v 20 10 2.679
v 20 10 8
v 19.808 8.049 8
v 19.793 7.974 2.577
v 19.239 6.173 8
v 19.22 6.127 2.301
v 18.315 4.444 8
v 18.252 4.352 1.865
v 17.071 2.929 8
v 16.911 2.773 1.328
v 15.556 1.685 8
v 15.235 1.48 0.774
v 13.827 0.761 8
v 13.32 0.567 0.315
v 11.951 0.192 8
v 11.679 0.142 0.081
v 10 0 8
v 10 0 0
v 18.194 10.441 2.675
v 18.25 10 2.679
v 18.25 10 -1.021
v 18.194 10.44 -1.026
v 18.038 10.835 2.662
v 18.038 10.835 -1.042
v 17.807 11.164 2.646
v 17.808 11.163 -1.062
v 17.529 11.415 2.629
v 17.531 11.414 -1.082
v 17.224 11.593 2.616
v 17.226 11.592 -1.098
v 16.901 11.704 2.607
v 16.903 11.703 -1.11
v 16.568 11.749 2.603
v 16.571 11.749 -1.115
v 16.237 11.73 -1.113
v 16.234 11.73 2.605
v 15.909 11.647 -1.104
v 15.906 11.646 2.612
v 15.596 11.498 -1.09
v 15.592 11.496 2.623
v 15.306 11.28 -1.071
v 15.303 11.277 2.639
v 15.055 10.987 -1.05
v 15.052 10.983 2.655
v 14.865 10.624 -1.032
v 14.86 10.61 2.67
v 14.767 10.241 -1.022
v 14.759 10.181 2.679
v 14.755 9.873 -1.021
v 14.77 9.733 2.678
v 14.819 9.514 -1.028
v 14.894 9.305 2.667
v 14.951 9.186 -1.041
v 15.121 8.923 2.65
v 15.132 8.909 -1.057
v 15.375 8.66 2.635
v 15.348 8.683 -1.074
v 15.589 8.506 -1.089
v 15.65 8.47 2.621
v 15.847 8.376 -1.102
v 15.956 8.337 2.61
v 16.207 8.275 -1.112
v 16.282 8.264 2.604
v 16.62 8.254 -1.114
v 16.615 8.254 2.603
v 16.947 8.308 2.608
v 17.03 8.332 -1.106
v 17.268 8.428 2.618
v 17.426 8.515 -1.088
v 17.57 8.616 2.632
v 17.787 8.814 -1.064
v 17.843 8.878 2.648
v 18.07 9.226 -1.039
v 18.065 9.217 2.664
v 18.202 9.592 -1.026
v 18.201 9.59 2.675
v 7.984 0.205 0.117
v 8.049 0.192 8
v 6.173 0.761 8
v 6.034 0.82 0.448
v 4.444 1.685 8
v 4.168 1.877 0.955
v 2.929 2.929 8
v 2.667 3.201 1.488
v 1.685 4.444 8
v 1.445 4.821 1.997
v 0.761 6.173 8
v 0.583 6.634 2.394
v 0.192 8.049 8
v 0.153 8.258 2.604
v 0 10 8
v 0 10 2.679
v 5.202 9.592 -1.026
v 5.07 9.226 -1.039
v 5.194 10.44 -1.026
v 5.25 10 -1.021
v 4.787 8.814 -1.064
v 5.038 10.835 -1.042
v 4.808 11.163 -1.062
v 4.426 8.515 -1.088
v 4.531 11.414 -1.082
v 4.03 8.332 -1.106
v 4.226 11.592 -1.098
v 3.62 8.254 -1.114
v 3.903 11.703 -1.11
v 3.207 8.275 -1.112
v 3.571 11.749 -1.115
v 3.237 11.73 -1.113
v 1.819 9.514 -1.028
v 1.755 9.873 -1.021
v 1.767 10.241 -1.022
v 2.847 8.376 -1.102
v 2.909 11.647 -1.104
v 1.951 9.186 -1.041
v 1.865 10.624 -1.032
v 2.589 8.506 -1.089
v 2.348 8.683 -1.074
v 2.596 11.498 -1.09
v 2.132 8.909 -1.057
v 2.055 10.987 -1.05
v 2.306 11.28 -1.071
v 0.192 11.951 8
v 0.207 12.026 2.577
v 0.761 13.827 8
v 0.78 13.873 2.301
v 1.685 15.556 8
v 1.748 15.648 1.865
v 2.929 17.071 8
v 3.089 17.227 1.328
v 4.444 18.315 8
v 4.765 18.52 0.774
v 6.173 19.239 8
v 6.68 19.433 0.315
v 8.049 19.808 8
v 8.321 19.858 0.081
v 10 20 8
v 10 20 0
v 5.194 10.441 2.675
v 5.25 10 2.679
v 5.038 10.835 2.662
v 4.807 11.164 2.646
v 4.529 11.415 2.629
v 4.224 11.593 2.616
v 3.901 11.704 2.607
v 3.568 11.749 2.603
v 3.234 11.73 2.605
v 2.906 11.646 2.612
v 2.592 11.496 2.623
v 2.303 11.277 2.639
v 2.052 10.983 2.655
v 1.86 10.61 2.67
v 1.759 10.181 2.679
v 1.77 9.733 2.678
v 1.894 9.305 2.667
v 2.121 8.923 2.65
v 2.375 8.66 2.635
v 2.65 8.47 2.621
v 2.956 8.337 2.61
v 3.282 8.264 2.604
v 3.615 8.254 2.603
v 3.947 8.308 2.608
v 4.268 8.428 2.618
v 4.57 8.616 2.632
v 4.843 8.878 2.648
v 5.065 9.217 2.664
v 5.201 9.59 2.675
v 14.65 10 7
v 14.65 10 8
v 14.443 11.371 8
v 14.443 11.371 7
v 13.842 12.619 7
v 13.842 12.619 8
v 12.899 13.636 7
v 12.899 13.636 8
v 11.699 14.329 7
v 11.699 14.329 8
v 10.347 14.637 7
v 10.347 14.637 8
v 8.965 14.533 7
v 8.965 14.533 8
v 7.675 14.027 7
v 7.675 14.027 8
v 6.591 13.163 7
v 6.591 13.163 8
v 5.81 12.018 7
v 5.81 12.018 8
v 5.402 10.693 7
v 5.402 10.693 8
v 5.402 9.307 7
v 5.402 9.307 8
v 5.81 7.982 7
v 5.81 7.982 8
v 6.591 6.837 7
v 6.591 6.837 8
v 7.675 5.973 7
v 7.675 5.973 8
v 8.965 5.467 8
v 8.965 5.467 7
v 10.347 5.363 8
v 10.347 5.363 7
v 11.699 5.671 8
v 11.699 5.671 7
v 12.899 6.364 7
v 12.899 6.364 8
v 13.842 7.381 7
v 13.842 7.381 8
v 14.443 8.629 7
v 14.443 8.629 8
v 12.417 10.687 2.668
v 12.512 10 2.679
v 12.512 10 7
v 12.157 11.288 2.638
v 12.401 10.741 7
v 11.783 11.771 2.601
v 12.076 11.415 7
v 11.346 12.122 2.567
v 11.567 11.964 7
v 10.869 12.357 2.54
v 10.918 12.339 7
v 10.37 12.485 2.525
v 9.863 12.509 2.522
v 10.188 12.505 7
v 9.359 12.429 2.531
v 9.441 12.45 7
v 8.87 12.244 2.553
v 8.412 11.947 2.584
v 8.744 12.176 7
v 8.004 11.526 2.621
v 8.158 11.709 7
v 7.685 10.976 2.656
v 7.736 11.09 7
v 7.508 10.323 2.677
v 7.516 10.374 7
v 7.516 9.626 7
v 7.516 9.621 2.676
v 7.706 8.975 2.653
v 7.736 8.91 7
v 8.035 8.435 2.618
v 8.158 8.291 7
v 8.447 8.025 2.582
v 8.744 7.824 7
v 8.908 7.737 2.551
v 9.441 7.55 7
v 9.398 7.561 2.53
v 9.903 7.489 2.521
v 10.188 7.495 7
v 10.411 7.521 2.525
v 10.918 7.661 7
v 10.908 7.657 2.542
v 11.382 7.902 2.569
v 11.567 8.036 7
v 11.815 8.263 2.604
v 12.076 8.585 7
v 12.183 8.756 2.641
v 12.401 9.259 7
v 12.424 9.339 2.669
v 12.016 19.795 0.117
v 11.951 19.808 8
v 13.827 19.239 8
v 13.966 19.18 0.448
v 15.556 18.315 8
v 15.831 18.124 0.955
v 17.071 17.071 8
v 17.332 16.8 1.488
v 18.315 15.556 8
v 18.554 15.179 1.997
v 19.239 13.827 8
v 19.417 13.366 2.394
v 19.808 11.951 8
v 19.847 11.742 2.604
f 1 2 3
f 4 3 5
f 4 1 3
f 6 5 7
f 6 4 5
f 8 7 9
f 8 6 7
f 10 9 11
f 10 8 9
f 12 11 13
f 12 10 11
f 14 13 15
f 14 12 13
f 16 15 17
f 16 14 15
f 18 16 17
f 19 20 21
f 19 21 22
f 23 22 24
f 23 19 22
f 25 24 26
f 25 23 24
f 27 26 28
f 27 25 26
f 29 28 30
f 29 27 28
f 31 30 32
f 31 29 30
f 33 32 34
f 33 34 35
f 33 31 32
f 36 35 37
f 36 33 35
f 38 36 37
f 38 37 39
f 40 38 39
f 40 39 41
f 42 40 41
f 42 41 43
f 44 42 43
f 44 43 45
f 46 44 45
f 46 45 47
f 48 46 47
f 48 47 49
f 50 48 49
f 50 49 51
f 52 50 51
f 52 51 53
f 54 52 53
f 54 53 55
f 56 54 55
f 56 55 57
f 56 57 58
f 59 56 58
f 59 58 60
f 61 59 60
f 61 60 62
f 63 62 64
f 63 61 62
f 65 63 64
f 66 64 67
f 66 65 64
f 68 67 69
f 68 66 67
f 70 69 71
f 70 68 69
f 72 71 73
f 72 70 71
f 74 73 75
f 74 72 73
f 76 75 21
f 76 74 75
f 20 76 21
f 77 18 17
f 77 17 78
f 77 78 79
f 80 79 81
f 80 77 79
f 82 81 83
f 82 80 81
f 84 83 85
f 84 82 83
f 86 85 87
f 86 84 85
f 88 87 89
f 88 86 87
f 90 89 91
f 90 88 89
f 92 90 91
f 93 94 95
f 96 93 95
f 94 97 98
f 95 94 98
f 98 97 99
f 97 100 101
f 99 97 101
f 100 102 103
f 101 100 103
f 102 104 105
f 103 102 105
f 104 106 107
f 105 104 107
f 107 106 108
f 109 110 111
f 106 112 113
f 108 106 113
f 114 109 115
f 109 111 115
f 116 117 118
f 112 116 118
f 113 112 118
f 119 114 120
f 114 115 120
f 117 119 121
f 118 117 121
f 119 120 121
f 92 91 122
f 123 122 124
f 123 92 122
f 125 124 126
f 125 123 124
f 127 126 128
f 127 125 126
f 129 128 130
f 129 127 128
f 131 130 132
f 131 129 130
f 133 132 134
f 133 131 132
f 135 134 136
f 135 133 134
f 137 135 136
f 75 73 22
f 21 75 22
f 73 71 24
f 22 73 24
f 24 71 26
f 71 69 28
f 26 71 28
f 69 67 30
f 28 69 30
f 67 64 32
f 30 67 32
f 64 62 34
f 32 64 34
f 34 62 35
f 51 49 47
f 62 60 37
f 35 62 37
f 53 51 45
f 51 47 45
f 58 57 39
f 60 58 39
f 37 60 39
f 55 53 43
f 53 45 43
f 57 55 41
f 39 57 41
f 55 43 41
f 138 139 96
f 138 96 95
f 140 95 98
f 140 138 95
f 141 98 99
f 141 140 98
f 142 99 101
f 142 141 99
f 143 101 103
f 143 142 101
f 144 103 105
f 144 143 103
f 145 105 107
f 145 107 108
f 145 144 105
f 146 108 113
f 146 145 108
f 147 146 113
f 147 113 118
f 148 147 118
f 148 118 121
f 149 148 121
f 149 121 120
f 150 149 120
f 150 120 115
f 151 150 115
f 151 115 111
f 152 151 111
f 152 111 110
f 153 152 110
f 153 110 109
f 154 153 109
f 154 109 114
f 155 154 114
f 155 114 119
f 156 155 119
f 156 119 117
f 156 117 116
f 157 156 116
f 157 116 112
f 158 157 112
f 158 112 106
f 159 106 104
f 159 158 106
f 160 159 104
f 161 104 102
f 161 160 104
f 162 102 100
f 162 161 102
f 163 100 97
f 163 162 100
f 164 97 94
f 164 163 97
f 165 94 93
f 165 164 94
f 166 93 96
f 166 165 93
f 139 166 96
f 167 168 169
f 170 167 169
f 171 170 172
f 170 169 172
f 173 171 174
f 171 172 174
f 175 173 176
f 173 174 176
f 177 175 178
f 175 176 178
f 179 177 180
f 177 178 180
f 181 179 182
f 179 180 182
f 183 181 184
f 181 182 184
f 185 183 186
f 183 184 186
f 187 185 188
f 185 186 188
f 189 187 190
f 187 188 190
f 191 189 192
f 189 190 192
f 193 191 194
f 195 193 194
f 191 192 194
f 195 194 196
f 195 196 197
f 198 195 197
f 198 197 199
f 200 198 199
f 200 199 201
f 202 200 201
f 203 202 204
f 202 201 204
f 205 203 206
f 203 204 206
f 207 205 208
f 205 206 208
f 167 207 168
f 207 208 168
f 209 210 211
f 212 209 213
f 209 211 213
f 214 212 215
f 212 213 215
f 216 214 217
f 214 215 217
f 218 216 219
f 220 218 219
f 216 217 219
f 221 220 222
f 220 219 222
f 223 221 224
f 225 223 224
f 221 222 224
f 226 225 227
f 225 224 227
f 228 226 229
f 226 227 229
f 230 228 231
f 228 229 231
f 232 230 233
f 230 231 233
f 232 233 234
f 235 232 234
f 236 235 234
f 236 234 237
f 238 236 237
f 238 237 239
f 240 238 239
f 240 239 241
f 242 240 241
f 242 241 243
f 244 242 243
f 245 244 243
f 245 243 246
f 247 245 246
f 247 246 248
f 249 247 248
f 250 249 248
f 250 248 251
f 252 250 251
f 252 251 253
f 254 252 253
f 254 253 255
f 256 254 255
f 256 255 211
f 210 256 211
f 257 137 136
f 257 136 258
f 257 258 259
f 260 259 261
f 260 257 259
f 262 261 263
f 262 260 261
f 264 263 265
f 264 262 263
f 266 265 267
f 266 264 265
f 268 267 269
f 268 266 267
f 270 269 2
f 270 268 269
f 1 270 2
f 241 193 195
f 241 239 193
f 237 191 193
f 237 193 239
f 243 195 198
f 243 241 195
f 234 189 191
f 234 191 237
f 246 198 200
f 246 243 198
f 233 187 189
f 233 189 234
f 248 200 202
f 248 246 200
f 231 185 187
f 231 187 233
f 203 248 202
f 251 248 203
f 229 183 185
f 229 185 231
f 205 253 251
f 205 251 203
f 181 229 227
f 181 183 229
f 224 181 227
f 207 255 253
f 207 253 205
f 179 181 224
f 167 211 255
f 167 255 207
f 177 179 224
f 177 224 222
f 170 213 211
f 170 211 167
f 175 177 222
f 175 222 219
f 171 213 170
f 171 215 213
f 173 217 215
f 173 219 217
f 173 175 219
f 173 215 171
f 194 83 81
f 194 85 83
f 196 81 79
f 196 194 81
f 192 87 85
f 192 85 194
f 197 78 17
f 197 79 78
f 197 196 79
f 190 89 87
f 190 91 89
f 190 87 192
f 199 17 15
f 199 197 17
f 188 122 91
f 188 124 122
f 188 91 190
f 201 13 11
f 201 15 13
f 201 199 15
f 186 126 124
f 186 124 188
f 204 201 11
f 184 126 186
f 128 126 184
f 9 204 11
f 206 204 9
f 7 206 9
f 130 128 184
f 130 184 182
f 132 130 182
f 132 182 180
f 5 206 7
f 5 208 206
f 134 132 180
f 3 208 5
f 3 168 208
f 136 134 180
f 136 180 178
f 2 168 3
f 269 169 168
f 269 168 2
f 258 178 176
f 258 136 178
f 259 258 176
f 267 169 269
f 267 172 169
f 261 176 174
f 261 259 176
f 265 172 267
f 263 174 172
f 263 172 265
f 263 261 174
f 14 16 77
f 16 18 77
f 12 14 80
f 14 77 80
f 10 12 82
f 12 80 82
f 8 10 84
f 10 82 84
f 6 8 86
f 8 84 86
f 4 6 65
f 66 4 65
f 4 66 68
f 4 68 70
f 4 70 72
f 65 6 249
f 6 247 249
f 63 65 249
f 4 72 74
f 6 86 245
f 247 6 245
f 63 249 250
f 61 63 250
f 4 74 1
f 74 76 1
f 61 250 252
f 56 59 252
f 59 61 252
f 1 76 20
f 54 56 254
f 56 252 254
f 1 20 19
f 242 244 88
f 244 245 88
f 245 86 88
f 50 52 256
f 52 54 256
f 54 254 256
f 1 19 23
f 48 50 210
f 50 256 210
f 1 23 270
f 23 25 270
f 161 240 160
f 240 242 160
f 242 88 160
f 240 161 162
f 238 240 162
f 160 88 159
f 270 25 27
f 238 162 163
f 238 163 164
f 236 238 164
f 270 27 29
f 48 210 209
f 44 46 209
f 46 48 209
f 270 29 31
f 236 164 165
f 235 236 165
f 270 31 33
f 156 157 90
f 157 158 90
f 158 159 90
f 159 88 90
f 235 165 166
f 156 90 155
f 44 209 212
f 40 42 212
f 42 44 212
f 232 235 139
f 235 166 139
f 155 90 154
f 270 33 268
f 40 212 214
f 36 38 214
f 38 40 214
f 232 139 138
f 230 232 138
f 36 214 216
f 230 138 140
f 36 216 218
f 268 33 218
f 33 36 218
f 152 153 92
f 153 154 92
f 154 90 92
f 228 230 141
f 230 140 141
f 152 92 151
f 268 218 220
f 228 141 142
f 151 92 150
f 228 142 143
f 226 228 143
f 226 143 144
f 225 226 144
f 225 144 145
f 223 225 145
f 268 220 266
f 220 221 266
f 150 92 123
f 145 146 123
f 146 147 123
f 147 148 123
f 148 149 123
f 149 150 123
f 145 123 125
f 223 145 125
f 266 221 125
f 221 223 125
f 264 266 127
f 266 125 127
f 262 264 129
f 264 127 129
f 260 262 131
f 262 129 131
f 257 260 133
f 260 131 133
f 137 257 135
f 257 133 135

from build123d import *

# Parameters (mm, degrees)
BOSS_EXTRUDE2_DEPTH      = 20
FILLET1_START            = -1
FILLET1_DEPTH            = 9
CUT_EXTRUDE2_REACH       = 31.394
CUT_EXTRUDE2_END_RADIUS  = 20
SKETCH4_R                = 2.5125
BOSS_EXTRUDE3_REACH      = 31.394
BOSS_EXTRUDE3_END_RADIUS = 16.3
SKETCH6_R                = 1.75
SKETCH7_R                = 4.65
CUT_EXTRUDE4_DEPTH       = 1


with BuildPart() as part:
    # Sketch3 → Boss-Extrude2 (new body)
    with BuildSketch(Plane(origin=(0, 0, 0), x_dir=(0, 0, -1), z_dir=(1, 0, 0))):
        with BuildLine():
            Line((0, 20), (-8, 20))
            Line((-8, 20), (-8, 0))
            Line((-8, 0), (0, 0))
            ThreePointArc((0, 0), (-2.679491924, 10), (0, 20))
        make_face()
    extrude(amount=BOSS_EXTRUDE2_DEPTH)

    # Fillet1: read off the stored shape, not the designer's step
    # Fillet1 outline → Fillet1 (cut)
    with BuildSketch(Plane.XY.offset(FILLET1_START)):
        with BuildLine():
            Line((0, 20), (0, 10))
            ThreePointArc((0, 10), (2.928932188, 17.071067812), (10, 20))
            Line((10, 20), (0, 20))
        make_face()
        with BuildLine():
            ThreePointArc((10, 0), (2.928932188, 2.928932188), (0, 10))
            Line((0, 10), (0, 0))
            Line((0, 0), (10, 0))
        make_face()
        with BuildLine():
            Line((20, 20), (10, 20))
            ThreePointArc((10, 20), (17.071067812, 17.071067812), (20, 10))
            Line((20, 10), (20, 20))
        make_face()
        with BuildLine():
            ThreePointArc((20, 10), (17.071067812, 2.928932188), (10, 0))
            Line((10, 0), (20, 0))
            Line((20, 0), (20, 10))
        make_face()
    extrude(amount=FILLET1_DEPTH, mode=Mode.SUBTRACT)

    # Cut-Extrude2: up to this cylinder (the profile starts outside it)
    cut_extrude2_end = Plane(origin=(10, 10, -17.320508076), z_dir=(-1, 0, 0)) * Cylinder(CUT_EXTRUDE2_END_RADIUS, 103.788, mode=Mode.PRIVATE)
    # Sketch4 → Cut-Extrude2 (cut, up to the surface)
    with BuildSketch(Plane.XY.offset(8), mode=Mode.PRIVATE) as cut_extrude2_sk1:
        with Locations((10, 10)):
            Circle(SKETCH4_R)
    cut_extrude2_tool1 = extrude(cut_extrude2_sk1.sketch, amount=-CUT_EXTRUDE2_REACH, mode=Mode.PRIVATE) - cut_extrude2_end
    add(cut_extrude2_tool1.solids().sort_by_distance((10, 10, 8))[0], mode=Mode.SUBTRACT)

    # Boss-Extrude3: up to this cylinder (the profile starts outside it)
    boss_extrude3_end = Plane(origin=(10, 10, -17.320508076), z_dir=(-1, 0, 0)) * Cylinder(BOSS_EXTRUDE3_END_RADIUS, 109.388, mode=Mode.PRIVATE)
    # Sketch6 → Boss-Extrude3 (add, up to the surface)
    with BuildSketch(Plane.XY.offset(8), mode=Mode.PRIVATE) as boss_extrude3_sk1:
        with Locations((3.5, 10)):
            Circle(SKETCH6_R)
    boss_extrude3_tool1 = extrude(boss_extrude3_sk1.sketch, amount=-BOSS_EXTRUDE3_REACH, mode=Mode.PRIVATE) - boss_extrude3_end
    add(boss_extrude3_tool1.solids().sort_by_distance((3.5, 10, 8))[0])
    # Sketch6 → Boss-Extrude3 (add, up to the surface)
    with BuildSketch(Plane.XY.offset(8), mode=Mode.PRIVATE) as boss_extrude3_sk2:
        with Locations((16.5, 10)):
            Circle(SKETCH6_R)
    boss_extrude3_tool2 = extrude(boss_extrude3_sk2.sketch, amount=-BOSS_EXTRUDE3_REACH, mode=Mode.PRIVATE) - boss_extrude3_end
    add(boss_extrude3_tool2.solids().sort_by_distance((16.5, 10, 8))[0])

    # Sketch7 → Cut-Extrude4 (cut)
    with BuildSketch(Plane.XY.offset(8)):
        with Locations((10, 10)):
            Circle(SKETCH7_R)
    extrude(amount=-CUT_EXTRUDE4_DEPTH, mode=Mode.SUBTRACT)


solid = part.part
